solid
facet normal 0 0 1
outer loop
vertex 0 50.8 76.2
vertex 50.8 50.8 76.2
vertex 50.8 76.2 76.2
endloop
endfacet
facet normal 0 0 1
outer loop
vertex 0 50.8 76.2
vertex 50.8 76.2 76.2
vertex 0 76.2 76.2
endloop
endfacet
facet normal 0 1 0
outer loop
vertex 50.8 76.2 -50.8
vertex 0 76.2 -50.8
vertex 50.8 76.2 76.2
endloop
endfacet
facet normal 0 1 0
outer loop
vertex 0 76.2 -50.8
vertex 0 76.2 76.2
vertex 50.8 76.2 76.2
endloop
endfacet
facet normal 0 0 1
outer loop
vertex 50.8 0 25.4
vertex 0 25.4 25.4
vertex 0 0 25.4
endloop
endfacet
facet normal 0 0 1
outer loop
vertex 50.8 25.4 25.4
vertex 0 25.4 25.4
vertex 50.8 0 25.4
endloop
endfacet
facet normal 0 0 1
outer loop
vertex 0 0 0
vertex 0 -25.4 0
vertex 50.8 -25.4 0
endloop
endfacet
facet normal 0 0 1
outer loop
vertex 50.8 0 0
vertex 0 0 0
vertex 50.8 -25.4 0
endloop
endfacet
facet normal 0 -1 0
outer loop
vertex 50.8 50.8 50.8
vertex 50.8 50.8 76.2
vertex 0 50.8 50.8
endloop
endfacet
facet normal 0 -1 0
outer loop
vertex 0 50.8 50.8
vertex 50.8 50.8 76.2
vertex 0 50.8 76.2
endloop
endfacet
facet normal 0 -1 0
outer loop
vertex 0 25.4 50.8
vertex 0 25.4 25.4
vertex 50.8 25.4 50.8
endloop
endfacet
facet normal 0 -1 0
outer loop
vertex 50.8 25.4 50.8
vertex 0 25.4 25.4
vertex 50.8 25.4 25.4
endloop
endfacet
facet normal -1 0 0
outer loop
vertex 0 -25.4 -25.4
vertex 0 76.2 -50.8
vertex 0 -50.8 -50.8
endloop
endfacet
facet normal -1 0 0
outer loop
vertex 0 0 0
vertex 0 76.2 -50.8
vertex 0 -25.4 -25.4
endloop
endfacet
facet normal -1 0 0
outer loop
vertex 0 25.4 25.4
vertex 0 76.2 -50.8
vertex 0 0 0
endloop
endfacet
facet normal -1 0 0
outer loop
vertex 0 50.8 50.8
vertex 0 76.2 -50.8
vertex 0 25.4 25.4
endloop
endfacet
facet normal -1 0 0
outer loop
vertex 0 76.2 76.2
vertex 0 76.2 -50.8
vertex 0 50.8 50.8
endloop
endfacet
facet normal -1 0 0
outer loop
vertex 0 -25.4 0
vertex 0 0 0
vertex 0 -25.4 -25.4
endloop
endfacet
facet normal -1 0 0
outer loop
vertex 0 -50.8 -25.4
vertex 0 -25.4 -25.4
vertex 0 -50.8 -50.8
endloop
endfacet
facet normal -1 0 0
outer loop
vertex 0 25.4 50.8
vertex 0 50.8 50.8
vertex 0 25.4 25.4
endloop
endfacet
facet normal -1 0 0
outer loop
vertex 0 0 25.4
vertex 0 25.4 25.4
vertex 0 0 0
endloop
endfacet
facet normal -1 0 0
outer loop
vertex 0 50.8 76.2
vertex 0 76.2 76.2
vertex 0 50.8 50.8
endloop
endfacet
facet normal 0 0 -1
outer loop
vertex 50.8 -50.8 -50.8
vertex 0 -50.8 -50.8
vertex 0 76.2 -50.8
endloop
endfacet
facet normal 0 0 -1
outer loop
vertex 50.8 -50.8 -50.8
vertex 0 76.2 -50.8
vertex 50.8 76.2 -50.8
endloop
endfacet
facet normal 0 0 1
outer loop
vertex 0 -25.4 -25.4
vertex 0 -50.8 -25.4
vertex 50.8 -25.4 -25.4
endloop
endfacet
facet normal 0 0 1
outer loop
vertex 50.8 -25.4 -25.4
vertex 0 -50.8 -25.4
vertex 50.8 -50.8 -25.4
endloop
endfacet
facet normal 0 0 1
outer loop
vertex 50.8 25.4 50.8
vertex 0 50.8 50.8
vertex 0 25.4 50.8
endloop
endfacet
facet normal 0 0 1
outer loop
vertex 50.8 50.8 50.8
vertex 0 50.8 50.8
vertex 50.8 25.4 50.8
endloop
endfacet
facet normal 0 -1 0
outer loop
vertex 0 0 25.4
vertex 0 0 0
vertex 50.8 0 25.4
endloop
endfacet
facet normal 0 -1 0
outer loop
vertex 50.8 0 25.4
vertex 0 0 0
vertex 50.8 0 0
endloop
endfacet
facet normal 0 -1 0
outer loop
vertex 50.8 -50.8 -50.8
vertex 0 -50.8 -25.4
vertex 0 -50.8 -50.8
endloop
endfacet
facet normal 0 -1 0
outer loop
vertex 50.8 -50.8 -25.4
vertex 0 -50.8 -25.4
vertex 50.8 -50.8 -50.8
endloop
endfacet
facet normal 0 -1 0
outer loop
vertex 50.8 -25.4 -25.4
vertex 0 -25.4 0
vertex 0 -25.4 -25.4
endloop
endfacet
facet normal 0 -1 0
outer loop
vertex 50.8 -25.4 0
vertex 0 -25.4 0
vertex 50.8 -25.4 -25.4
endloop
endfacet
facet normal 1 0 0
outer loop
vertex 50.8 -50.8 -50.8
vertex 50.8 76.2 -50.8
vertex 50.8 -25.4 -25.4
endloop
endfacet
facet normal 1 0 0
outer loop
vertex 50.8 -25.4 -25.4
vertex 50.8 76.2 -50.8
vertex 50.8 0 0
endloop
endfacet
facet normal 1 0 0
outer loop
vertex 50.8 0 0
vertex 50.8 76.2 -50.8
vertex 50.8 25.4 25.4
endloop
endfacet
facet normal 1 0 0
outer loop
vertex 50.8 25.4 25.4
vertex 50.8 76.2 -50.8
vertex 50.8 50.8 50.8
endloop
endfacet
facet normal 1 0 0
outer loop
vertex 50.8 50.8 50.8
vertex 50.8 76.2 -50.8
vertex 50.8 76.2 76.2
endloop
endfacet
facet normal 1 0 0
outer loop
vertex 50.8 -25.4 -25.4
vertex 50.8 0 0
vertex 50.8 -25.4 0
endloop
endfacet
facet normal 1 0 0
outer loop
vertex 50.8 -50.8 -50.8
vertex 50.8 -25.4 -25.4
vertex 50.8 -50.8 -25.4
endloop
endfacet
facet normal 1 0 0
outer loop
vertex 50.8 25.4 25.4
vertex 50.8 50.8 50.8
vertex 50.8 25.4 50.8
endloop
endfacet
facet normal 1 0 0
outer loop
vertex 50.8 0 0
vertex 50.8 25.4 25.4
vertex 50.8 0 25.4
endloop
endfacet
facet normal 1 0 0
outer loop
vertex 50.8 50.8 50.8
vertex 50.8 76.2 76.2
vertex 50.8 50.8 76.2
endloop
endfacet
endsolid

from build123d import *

# Parameters (mm, degrees)
F0_W     = 50.8
F0_H     = 50.8
F1_DEPTH = 25.4
F2_W     = 50.8
F2_H     = 25.4
F3_DEPTH = 25.4
F4_W     = 50.8
F4_H     = 76.2
F5_DEPTH = 25.4
F6_W     = 50.8
F6_H     = 101.6
F7_DEPTH = 25.4
F8_W     = 50.8
F8_H     = 127
F9_DEPTH = 25.4


with BuildPart() as f1:
    # F0 (on Top) → F1 (new body)
    with BuildSketch(Plane.XY):
        with Locations((25.4, 25.4)):
            Rectangle(F0_W, F0_H)
    extrude(amount=F1_DEPTH)

    # F2 (on face) → F3 (join)
    with BuildSketch(Plane.XY.offset(25.4)):
        with Locations((25.4, 38.1)):
            Rectangle(F2_W, F2_H)
    extrude(amount=F3_DEPTH)

    # F4 (on face) → F5 (join)
    with BuildSketch(Plane(origin=(0, 50.8, 0), x_dir=(-1, 0, 0), z_dir=(0, 1, 0))):
        with Locations((-25.4, 38.1)):
            Rectangle(F4_W, F4_H)
    extrude(amount=F5_DEPTH)

    # F6 (on face) → F7 (join)
    with BuildSketch(Plane(origin=(0, 0, 0), x_dir=(1, 0, 0), z_dir=(0, 0, -1))):
        with Locations((25.4, -25.4)):
            Rectangle(F6_W, F6_H)
    extrude(amount=F7_DEPTH)

    # F8 (on face) → F9 (join)
    with BuildSketch(Plane(origin=(0, 0, -25.4), x_dir=(1, 0, 0), z_dir=(0, 0, -1))):
        with Locations((25.4, -12.7)):
            Rectangle(F8_W, F8_H)
    extrude(amount=F9_DEPTH)


solid = f1.part
